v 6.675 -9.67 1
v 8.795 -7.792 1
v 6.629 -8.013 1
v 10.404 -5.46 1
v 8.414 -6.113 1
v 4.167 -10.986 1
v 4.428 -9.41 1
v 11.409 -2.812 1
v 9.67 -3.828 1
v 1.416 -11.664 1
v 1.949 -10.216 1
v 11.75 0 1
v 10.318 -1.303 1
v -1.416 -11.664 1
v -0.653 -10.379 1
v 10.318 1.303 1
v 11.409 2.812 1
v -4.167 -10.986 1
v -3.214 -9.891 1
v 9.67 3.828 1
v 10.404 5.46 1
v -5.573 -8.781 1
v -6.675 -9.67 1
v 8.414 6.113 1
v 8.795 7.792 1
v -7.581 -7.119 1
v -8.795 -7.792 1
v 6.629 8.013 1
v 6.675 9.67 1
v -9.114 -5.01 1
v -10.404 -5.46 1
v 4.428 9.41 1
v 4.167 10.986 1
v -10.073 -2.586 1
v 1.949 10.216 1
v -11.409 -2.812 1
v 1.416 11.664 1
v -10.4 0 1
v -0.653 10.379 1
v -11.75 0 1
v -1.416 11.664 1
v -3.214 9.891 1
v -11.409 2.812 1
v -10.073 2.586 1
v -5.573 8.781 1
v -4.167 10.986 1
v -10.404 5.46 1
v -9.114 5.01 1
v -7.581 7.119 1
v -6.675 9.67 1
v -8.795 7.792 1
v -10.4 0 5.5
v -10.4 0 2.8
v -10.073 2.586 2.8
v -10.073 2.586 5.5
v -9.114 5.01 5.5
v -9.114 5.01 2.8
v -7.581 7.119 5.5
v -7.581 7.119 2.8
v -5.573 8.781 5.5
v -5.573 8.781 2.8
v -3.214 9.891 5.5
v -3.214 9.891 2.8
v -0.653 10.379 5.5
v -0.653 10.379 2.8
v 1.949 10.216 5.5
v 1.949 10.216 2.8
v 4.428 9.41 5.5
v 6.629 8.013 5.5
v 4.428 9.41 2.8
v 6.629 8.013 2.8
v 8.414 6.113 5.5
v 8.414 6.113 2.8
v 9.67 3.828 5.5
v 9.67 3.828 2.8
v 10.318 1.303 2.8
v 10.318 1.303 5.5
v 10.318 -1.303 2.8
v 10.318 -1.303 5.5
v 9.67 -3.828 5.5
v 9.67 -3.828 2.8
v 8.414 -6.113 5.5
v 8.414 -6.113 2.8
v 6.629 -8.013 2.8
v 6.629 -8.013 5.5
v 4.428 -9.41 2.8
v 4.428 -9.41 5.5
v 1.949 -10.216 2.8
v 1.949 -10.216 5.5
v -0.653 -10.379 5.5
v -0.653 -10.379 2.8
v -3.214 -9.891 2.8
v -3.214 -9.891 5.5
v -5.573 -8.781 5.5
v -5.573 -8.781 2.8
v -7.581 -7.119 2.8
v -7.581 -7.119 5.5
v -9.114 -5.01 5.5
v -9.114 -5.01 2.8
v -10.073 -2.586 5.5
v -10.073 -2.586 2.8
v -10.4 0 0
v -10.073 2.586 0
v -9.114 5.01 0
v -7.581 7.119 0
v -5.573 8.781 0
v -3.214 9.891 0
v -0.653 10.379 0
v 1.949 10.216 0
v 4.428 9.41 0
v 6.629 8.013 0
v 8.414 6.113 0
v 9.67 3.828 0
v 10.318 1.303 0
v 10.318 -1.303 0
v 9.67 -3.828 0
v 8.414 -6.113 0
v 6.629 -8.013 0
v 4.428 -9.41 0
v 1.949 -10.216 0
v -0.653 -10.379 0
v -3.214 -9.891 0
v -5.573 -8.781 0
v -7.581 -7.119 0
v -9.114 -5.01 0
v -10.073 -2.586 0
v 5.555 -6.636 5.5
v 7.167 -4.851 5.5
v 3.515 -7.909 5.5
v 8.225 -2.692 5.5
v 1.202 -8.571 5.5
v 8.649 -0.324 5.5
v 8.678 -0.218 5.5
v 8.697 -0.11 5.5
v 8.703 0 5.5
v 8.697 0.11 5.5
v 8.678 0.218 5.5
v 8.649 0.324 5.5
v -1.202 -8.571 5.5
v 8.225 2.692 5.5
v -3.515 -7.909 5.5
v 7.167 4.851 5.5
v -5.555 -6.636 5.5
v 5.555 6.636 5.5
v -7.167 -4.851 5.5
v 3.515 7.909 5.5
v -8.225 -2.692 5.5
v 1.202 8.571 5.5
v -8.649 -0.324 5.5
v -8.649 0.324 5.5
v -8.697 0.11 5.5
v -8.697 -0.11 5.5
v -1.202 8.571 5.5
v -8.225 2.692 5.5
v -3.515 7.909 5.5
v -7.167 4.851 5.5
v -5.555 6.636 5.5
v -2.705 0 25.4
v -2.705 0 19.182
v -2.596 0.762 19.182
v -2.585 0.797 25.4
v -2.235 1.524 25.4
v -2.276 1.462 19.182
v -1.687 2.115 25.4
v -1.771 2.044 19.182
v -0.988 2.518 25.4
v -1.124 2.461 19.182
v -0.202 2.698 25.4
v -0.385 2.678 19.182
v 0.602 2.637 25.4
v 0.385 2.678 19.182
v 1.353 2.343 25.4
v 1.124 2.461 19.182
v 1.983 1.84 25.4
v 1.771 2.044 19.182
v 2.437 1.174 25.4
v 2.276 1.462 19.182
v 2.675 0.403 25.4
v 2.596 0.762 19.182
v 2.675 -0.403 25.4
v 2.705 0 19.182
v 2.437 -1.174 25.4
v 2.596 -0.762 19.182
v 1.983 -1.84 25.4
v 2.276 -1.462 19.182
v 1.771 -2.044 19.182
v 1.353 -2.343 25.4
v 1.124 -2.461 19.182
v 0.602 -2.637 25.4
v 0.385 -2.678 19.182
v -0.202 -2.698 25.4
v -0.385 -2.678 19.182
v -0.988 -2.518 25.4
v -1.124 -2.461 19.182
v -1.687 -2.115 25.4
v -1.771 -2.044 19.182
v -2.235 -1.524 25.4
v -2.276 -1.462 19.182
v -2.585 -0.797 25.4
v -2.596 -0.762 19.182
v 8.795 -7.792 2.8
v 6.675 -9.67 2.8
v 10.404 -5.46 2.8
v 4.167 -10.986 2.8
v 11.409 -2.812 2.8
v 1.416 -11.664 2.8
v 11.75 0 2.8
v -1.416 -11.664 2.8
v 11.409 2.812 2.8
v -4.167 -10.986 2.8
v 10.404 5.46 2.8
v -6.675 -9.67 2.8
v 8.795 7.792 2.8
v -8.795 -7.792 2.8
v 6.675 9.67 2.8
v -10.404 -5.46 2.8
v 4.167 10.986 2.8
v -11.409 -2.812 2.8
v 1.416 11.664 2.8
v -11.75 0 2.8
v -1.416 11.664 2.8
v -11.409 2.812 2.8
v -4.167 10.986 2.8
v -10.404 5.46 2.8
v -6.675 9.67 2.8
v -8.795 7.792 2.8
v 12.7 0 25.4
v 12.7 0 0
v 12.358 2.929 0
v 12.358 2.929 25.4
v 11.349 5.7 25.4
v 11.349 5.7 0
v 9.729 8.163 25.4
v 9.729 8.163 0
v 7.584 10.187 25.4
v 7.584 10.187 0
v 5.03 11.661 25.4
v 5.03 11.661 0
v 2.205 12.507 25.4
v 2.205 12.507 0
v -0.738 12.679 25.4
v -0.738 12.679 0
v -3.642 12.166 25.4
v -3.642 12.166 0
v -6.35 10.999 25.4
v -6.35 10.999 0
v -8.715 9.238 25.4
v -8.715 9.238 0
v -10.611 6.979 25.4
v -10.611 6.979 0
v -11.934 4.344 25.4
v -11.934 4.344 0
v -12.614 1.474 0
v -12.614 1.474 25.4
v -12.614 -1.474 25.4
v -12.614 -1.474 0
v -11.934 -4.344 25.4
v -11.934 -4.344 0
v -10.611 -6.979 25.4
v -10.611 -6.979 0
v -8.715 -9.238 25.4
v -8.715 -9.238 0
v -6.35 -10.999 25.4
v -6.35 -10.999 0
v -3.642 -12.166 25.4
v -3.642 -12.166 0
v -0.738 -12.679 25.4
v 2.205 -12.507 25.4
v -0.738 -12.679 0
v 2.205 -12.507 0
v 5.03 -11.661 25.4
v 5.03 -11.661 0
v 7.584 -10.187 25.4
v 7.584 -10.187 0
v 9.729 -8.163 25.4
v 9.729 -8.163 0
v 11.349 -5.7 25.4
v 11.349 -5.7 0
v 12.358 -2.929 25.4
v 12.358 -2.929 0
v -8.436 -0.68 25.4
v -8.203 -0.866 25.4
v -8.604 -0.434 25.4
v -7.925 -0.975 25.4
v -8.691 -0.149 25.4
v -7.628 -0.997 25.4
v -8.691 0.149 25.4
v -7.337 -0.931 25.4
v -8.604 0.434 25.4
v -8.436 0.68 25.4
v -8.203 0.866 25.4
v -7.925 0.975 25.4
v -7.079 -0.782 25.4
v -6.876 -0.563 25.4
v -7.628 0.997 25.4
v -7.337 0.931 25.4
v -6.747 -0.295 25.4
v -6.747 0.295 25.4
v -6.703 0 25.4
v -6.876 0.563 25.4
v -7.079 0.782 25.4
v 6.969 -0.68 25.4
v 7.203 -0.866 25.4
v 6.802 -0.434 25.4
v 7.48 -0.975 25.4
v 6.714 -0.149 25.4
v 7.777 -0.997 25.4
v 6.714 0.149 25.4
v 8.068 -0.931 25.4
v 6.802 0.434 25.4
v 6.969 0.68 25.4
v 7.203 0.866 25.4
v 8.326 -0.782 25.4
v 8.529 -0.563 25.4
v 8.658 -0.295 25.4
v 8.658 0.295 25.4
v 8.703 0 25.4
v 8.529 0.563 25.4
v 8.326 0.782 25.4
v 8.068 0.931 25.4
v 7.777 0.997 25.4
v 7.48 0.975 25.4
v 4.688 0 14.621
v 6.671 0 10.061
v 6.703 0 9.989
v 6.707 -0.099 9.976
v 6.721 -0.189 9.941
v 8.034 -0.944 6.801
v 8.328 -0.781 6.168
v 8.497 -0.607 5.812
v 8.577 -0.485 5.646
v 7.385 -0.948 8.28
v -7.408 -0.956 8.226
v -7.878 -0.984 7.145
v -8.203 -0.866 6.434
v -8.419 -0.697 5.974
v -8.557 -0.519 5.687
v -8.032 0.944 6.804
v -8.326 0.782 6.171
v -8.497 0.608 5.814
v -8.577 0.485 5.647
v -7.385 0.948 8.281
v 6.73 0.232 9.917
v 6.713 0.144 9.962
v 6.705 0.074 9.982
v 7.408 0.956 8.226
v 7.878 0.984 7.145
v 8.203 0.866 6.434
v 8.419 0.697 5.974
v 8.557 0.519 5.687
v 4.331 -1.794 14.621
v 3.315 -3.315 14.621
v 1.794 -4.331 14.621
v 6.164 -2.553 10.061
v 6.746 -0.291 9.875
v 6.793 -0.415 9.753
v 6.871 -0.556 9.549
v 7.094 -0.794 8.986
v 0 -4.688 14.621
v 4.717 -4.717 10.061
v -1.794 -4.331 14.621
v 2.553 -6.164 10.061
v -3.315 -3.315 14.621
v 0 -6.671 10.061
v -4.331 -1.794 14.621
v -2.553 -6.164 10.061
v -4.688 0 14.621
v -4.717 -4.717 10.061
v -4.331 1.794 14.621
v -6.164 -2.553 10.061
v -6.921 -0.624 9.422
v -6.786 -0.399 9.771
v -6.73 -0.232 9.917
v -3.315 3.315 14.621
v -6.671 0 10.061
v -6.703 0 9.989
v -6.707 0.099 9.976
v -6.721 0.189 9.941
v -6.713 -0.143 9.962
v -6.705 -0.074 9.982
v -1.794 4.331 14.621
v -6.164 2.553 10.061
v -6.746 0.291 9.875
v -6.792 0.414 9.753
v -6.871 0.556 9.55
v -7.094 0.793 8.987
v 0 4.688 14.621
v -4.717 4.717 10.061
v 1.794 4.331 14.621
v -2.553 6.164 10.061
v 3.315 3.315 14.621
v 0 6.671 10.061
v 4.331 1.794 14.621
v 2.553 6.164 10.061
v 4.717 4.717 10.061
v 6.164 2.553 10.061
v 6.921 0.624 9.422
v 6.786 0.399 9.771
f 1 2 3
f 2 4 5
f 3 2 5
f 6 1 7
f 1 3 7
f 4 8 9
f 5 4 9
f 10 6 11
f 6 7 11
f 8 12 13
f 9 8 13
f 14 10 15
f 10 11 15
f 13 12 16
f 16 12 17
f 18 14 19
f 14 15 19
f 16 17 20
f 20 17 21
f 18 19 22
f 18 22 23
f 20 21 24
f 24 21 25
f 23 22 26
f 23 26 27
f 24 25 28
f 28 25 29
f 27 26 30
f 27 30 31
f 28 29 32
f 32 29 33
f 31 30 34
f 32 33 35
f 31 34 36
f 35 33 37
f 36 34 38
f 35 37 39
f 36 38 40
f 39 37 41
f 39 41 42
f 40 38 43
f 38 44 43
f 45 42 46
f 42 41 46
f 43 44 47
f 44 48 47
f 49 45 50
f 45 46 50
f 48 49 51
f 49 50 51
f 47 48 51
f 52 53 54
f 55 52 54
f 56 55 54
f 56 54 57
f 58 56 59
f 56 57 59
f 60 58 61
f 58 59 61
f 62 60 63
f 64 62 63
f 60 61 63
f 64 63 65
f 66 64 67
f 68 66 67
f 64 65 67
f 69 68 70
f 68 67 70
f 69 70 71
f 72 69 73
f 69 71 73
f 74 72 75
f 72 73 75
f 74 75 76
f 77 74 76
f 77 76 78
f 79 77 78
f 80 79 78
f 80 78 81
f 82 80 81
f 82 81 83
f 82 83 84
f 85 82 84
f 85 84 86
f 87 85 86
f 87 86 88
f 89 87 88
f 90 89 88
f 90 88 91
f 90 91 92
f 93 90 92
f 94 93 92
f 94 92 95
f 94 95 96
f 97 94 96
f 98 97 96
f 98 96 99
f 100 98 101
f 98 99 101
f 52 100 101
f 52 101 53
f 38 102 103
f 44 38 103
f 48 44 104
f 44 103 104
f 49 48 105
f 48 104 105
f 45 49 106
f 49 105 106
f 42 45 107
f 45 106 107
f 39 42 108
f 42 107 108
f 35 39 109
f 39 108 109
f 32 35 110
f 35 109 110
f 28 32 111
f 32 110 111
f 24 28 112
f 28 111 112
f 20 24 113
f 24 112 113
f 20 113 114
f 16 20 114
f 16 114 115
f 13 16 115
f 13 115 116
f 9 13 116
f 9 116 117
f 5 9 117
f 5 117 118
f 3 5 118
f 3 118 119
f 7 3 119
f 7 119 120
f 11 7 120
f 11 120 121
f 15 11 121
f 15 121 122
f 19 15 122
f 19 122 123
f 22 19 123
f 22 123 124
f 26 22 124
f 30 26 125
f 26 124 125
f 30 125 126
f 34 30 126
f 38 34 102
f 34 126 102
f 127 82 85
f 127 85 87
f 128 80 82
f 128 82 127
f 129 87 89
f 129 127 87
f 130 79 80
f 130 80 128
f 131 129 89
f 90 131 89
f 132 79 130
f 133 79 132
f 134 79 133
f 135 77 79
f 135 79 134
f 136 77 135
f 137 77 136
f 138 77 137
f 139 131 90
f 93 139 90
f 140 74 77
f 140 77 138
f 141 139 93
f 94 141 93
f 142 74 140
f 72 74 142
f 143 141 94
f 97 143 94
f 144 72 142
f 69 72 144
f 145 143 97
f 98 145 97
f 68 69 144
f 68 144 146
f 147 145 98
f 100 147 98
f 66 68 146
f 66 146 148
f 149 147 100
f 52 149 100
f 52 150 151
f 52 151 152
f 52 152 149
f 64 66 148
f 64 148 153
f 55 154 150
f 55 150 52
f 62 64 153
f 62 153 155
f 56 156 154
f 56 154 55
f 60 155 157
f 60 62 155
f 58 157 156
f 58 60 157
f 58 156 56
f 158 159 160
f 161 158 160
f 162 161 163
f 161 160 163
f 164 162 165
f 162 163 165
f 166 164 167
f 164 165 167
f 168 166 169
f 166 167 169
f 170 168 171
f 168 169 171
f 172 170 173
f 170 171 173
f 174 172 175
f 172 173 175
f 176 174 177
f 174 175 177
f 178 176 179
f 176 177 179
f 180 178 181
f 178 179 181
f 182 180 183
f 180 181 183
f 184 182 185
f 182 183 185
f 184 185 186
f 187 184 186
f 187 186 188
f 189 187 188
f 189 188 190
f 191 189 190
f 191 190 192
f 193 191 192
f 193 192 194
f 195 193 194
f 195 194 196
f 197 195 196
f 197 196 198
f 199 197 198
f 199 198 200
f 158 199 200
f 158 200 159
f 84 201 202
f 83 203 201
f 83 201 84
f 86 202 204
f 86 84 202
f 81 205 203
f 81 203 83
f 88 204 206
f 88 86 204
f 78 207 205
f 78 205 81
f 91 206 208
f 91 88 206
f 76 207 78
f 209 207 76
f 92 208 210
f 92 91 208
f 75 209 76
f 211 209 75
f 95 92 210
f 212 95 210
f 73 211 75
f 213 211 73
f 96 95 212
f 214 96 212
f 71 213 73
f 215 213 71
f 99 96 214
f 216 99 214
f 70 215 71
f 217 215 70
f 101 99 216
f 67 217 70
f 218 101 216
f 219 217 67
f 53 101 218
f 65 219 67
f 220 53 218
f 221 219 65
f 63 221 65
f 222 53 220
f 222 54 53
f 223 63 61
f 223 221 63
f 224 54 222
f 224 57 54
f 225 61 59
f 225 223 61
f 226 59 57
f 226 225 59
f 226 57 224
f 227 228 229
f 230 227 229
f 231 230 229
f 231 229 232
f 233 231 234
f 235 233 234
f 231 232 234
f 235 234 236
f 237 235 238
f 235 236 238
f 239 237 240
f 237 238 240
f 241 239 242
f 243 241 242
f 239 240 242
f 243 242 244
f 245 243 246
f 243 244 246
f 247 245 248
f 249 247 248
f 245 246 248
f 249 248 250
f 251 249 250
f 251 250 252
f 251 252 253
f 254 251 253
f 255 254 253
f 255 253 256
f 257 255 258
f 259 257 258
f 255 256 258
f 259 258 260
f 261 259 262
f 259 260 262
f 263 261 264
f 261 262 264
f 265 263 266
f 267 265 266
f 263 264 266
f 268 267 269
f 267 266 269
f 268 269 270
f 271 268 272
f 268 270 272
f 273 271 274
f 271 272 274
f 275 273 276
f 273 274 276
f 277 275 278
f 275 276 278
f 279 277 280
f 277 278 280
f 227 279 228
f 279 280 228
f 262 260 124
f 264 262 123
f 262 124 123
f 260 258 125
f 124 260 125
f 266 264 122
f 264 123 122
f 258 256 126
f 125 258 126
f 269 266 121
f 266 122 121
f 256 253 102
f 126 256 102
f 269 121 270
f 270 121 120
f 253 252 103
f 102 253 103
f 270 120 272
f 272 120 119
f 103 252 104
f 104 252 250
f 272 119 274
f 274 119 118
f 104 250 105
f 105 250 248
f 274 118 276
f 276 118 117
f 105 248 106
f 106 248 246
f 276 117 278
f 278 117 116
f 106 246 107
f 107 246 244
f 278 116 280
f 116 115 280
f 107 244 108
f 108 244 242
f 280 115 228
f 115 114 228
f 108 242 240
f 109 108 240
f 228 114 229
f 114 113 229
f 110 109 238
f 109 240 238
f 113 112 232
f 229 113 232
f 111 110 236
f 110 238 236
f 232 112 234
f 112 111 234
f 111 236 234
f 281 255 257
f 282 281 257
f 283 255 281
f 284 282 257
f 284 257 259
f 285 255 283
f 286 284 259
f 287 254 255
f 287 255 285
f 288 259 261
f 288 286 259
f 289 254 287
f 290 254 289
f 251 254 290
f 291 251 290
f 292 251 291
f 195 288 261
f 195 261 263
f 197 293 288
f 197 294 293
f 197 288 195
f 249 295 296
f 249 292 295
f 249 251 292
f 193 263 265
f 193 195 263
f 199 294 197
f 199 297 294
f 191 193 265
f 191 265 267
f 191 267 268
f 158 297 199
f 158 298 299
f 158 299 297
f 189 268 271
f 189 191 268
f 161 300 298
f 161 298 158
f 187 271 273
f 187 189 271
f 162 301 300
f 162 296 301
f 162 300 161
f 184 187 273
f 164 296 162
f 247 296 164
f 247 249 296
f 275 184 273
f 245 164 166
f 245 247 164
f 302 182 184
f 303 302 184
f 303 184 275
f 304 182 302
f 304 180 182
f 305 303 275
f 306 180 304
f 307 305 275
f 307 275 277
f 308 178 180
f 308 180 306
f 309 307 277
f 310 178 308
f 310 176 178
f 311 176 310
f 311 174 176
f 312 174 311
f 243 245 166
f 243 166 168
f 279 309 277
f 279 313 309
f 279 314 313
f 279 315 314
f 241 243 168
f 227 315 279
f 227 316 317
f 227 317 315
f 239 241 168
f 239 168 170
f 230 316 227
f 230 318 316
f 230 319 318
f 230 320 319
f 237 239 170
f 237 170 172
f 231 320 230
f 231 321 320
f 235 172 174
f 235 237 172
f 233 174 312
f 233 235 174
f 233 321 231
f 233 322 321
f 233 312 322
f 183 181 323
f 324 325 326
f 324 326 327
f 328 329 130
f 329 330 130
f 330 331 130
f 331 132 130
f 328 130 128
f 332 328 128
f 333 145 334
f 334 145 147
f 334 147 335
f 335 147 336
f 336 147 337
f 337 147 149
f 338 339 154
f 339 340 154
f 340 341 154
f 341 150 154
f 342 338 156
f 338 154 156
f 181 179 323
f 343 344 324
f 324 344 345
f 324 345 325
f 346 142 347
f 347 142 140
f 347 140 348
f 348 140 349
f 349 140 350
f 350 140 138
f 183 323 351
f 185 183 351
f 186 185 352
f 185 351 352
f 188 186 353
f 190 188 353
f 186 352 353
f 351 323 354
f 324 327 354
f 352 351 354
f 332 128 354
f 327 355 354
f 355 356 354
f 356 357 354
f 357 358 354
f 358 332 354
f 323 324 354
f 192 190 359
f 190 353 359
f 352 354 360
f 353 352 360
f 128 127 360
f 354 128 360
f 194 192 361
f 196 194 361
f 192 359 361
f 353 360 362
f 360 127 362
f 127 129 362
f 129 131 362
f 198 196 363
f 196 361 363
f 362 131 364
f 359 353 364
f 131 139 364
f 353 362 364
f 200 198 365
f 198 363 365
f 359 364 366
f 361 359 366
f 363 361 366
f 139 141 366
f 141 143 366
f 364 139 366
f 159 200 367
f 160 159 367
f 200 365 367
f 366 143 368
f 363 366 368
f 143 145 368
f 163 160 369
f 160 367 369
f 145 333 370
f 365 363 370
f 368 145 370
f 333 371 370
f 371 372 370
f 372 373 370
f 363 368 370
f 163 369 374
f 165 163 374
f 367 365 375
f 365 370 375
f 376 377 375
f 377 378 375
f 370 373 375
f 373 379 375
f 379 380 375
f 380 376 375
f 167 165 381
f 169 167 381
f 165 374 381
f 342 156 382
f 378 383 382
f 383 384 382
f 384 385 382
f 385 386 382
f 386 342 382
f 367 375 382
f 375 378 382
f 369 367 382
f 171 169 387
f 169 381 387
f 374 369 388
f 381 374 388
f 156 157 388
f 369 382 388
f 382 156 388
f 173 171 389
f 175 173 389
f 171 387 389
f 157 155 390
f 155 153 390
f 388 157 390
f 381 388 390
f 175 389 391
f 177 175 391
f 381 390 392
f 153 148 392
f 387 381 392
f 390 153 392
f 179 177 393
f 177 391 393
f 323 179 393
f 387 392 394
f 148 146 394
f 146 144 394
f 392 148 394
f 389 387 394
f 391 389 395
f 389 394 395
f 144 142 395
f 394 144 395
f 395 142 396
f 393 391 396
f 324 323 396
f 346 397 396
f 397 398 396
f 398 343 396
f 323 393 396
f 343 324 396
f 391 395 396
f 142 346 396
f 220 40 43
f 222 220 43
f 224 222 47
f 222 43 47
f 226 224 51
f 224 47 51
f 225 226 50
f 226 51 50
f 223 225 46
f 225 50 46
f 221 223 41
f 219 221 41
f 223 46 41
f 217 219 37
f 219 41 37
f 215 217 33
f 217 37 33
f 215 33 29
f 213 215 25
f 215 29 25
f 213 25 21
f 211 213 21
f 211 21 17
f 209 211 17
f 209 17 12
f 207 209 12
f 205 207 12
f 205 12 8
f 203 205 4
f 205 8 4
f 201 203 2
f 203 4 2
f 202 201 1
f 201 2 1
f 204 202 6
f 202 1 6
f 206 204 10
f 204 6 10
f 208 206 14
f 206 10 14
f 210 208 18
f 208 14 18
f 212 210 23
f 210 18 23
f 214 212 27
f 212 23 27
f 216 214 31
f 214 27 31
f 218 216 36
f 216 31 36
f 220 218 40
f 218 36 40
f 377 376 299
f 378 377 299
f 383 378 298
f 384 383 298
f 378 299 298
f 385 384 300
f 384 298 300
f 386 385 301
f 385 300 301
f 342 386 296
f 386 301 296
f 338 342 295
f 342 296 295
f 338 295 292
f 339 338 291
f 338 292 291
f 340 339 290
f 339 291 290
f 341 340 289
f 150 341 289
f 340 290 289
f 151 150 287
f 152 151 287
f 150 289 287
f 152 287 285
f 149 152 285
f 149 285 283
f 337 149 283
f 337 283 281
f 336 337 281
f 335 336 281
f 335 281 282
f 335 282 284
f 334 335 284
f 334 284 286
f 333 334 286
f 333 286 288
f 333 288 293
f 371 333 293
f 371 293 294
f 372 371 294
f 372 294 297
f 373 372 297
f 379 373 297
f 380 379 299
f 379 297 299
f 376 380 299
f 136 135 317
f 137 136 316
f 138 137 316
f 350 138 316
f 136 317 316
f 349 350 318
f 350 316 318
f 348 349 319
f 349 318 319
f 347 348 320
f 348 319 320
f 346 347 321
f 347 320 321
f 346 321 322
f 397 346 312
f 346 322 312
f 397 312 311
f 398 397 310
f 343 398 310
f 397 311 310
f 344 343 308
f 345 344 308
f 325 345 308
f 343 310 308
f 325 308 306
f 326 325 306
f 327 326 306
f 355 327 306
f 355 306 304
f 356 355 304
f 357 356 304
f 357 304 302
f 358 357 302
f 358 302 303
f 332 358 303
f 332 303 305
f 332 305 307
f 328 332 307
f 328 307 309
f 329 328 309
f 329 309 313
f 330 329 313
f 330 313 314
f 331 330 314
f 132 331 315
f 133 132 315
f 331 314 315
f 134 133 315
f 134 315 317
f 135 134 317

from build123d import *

# Parameters (mm, degrees)
SKETCH1_R               = 12.7
BOSS_EXTRUDE1_DEPTH     = 25.4
SKETCH2_R               = 10.4
CUT_EXTRUDE1_DEPTH      = 5.5
CUT_EXTRUDE2_START      = -1
SKETCH3_R               = 11.75
CUT_EXTRUDE2_DEPTH      = 1.8
F_1_4_28_TAPPED_HOLE1_D = 5.4102
SKETCH11_R              = 1
CUT_EXTRUDE3_DEPTH      = 26.4


with BuildPart() as part:
    # Sketch1 → Boss-Extrude1 (new body)
    with BuildSketch(Plane.XY):
        Circle(SKETCH1_R)
    extrude(amount=BOSS_EXTRUDE1_DEPTH)

    # Sketch2 → Cut-Extrude1 (cut)
    with BuildSketch(Plane(origin=(0, 0, 0), x_dir=(-1, 0, 0), z_dir=(0, 0, -1))):
        Circle(SKETCH2_R)
    extrude(amount=-CUT_EXTRUDE1_DEPTH, mode=Mode.SUBTRACT)

    # Sketch3 → Cut-Extrude2 (cut)
    with BuildSketch(Plane(origin=(0, 0, 0), x_dir=(-1, 0, 0), z_dir=(0, 0, -1)).offset(CUT_EXTRUDE2_START)):
        Circle(SKETCH3_R)
    extrude(amount=-CUT_EXTRUDE2_DEPTH, mode=Mode.SUBTRACT)

    # 1/4-28 Tapped Hole1 (through all)
    with Locations(Plane.XY.offset(25.4)):
        with Locations((0, 0)):
            Hole(F_1_4_28_TAPPED_HOLE1_D / 2)

    # Sketch10 → Cut-Revolve1 (revolve, cut)
    with BuildSketch(Plane(origin=(0, 0, 0), x_dir=(1, 0, 0), z_dir=(0, 1, 0))):
        Polygon((0, -25.402256059), (8.654624222, -5.5), (0, -5.5), align=None)
    revolve(axis=Axis((0, 0, 29.736025406), (0, 0, -1)), mode=Mode.SUBTRACT)

    # Sketch11 → Cut-Extrude3 (cut, through all)
    with BuildSketch(Plane.XY.offset(25.4)):
        with Locations((-7.70255, 0)):
            Circle(SKETCH11_R)
        with Locations((7.70255, 0)):
            Circle(SKETCH11_R)
    extrude(amount=-CUT_EXTRUDE3_DEPTH, mode=Mode.SUBTRACT)


solid = part.part
